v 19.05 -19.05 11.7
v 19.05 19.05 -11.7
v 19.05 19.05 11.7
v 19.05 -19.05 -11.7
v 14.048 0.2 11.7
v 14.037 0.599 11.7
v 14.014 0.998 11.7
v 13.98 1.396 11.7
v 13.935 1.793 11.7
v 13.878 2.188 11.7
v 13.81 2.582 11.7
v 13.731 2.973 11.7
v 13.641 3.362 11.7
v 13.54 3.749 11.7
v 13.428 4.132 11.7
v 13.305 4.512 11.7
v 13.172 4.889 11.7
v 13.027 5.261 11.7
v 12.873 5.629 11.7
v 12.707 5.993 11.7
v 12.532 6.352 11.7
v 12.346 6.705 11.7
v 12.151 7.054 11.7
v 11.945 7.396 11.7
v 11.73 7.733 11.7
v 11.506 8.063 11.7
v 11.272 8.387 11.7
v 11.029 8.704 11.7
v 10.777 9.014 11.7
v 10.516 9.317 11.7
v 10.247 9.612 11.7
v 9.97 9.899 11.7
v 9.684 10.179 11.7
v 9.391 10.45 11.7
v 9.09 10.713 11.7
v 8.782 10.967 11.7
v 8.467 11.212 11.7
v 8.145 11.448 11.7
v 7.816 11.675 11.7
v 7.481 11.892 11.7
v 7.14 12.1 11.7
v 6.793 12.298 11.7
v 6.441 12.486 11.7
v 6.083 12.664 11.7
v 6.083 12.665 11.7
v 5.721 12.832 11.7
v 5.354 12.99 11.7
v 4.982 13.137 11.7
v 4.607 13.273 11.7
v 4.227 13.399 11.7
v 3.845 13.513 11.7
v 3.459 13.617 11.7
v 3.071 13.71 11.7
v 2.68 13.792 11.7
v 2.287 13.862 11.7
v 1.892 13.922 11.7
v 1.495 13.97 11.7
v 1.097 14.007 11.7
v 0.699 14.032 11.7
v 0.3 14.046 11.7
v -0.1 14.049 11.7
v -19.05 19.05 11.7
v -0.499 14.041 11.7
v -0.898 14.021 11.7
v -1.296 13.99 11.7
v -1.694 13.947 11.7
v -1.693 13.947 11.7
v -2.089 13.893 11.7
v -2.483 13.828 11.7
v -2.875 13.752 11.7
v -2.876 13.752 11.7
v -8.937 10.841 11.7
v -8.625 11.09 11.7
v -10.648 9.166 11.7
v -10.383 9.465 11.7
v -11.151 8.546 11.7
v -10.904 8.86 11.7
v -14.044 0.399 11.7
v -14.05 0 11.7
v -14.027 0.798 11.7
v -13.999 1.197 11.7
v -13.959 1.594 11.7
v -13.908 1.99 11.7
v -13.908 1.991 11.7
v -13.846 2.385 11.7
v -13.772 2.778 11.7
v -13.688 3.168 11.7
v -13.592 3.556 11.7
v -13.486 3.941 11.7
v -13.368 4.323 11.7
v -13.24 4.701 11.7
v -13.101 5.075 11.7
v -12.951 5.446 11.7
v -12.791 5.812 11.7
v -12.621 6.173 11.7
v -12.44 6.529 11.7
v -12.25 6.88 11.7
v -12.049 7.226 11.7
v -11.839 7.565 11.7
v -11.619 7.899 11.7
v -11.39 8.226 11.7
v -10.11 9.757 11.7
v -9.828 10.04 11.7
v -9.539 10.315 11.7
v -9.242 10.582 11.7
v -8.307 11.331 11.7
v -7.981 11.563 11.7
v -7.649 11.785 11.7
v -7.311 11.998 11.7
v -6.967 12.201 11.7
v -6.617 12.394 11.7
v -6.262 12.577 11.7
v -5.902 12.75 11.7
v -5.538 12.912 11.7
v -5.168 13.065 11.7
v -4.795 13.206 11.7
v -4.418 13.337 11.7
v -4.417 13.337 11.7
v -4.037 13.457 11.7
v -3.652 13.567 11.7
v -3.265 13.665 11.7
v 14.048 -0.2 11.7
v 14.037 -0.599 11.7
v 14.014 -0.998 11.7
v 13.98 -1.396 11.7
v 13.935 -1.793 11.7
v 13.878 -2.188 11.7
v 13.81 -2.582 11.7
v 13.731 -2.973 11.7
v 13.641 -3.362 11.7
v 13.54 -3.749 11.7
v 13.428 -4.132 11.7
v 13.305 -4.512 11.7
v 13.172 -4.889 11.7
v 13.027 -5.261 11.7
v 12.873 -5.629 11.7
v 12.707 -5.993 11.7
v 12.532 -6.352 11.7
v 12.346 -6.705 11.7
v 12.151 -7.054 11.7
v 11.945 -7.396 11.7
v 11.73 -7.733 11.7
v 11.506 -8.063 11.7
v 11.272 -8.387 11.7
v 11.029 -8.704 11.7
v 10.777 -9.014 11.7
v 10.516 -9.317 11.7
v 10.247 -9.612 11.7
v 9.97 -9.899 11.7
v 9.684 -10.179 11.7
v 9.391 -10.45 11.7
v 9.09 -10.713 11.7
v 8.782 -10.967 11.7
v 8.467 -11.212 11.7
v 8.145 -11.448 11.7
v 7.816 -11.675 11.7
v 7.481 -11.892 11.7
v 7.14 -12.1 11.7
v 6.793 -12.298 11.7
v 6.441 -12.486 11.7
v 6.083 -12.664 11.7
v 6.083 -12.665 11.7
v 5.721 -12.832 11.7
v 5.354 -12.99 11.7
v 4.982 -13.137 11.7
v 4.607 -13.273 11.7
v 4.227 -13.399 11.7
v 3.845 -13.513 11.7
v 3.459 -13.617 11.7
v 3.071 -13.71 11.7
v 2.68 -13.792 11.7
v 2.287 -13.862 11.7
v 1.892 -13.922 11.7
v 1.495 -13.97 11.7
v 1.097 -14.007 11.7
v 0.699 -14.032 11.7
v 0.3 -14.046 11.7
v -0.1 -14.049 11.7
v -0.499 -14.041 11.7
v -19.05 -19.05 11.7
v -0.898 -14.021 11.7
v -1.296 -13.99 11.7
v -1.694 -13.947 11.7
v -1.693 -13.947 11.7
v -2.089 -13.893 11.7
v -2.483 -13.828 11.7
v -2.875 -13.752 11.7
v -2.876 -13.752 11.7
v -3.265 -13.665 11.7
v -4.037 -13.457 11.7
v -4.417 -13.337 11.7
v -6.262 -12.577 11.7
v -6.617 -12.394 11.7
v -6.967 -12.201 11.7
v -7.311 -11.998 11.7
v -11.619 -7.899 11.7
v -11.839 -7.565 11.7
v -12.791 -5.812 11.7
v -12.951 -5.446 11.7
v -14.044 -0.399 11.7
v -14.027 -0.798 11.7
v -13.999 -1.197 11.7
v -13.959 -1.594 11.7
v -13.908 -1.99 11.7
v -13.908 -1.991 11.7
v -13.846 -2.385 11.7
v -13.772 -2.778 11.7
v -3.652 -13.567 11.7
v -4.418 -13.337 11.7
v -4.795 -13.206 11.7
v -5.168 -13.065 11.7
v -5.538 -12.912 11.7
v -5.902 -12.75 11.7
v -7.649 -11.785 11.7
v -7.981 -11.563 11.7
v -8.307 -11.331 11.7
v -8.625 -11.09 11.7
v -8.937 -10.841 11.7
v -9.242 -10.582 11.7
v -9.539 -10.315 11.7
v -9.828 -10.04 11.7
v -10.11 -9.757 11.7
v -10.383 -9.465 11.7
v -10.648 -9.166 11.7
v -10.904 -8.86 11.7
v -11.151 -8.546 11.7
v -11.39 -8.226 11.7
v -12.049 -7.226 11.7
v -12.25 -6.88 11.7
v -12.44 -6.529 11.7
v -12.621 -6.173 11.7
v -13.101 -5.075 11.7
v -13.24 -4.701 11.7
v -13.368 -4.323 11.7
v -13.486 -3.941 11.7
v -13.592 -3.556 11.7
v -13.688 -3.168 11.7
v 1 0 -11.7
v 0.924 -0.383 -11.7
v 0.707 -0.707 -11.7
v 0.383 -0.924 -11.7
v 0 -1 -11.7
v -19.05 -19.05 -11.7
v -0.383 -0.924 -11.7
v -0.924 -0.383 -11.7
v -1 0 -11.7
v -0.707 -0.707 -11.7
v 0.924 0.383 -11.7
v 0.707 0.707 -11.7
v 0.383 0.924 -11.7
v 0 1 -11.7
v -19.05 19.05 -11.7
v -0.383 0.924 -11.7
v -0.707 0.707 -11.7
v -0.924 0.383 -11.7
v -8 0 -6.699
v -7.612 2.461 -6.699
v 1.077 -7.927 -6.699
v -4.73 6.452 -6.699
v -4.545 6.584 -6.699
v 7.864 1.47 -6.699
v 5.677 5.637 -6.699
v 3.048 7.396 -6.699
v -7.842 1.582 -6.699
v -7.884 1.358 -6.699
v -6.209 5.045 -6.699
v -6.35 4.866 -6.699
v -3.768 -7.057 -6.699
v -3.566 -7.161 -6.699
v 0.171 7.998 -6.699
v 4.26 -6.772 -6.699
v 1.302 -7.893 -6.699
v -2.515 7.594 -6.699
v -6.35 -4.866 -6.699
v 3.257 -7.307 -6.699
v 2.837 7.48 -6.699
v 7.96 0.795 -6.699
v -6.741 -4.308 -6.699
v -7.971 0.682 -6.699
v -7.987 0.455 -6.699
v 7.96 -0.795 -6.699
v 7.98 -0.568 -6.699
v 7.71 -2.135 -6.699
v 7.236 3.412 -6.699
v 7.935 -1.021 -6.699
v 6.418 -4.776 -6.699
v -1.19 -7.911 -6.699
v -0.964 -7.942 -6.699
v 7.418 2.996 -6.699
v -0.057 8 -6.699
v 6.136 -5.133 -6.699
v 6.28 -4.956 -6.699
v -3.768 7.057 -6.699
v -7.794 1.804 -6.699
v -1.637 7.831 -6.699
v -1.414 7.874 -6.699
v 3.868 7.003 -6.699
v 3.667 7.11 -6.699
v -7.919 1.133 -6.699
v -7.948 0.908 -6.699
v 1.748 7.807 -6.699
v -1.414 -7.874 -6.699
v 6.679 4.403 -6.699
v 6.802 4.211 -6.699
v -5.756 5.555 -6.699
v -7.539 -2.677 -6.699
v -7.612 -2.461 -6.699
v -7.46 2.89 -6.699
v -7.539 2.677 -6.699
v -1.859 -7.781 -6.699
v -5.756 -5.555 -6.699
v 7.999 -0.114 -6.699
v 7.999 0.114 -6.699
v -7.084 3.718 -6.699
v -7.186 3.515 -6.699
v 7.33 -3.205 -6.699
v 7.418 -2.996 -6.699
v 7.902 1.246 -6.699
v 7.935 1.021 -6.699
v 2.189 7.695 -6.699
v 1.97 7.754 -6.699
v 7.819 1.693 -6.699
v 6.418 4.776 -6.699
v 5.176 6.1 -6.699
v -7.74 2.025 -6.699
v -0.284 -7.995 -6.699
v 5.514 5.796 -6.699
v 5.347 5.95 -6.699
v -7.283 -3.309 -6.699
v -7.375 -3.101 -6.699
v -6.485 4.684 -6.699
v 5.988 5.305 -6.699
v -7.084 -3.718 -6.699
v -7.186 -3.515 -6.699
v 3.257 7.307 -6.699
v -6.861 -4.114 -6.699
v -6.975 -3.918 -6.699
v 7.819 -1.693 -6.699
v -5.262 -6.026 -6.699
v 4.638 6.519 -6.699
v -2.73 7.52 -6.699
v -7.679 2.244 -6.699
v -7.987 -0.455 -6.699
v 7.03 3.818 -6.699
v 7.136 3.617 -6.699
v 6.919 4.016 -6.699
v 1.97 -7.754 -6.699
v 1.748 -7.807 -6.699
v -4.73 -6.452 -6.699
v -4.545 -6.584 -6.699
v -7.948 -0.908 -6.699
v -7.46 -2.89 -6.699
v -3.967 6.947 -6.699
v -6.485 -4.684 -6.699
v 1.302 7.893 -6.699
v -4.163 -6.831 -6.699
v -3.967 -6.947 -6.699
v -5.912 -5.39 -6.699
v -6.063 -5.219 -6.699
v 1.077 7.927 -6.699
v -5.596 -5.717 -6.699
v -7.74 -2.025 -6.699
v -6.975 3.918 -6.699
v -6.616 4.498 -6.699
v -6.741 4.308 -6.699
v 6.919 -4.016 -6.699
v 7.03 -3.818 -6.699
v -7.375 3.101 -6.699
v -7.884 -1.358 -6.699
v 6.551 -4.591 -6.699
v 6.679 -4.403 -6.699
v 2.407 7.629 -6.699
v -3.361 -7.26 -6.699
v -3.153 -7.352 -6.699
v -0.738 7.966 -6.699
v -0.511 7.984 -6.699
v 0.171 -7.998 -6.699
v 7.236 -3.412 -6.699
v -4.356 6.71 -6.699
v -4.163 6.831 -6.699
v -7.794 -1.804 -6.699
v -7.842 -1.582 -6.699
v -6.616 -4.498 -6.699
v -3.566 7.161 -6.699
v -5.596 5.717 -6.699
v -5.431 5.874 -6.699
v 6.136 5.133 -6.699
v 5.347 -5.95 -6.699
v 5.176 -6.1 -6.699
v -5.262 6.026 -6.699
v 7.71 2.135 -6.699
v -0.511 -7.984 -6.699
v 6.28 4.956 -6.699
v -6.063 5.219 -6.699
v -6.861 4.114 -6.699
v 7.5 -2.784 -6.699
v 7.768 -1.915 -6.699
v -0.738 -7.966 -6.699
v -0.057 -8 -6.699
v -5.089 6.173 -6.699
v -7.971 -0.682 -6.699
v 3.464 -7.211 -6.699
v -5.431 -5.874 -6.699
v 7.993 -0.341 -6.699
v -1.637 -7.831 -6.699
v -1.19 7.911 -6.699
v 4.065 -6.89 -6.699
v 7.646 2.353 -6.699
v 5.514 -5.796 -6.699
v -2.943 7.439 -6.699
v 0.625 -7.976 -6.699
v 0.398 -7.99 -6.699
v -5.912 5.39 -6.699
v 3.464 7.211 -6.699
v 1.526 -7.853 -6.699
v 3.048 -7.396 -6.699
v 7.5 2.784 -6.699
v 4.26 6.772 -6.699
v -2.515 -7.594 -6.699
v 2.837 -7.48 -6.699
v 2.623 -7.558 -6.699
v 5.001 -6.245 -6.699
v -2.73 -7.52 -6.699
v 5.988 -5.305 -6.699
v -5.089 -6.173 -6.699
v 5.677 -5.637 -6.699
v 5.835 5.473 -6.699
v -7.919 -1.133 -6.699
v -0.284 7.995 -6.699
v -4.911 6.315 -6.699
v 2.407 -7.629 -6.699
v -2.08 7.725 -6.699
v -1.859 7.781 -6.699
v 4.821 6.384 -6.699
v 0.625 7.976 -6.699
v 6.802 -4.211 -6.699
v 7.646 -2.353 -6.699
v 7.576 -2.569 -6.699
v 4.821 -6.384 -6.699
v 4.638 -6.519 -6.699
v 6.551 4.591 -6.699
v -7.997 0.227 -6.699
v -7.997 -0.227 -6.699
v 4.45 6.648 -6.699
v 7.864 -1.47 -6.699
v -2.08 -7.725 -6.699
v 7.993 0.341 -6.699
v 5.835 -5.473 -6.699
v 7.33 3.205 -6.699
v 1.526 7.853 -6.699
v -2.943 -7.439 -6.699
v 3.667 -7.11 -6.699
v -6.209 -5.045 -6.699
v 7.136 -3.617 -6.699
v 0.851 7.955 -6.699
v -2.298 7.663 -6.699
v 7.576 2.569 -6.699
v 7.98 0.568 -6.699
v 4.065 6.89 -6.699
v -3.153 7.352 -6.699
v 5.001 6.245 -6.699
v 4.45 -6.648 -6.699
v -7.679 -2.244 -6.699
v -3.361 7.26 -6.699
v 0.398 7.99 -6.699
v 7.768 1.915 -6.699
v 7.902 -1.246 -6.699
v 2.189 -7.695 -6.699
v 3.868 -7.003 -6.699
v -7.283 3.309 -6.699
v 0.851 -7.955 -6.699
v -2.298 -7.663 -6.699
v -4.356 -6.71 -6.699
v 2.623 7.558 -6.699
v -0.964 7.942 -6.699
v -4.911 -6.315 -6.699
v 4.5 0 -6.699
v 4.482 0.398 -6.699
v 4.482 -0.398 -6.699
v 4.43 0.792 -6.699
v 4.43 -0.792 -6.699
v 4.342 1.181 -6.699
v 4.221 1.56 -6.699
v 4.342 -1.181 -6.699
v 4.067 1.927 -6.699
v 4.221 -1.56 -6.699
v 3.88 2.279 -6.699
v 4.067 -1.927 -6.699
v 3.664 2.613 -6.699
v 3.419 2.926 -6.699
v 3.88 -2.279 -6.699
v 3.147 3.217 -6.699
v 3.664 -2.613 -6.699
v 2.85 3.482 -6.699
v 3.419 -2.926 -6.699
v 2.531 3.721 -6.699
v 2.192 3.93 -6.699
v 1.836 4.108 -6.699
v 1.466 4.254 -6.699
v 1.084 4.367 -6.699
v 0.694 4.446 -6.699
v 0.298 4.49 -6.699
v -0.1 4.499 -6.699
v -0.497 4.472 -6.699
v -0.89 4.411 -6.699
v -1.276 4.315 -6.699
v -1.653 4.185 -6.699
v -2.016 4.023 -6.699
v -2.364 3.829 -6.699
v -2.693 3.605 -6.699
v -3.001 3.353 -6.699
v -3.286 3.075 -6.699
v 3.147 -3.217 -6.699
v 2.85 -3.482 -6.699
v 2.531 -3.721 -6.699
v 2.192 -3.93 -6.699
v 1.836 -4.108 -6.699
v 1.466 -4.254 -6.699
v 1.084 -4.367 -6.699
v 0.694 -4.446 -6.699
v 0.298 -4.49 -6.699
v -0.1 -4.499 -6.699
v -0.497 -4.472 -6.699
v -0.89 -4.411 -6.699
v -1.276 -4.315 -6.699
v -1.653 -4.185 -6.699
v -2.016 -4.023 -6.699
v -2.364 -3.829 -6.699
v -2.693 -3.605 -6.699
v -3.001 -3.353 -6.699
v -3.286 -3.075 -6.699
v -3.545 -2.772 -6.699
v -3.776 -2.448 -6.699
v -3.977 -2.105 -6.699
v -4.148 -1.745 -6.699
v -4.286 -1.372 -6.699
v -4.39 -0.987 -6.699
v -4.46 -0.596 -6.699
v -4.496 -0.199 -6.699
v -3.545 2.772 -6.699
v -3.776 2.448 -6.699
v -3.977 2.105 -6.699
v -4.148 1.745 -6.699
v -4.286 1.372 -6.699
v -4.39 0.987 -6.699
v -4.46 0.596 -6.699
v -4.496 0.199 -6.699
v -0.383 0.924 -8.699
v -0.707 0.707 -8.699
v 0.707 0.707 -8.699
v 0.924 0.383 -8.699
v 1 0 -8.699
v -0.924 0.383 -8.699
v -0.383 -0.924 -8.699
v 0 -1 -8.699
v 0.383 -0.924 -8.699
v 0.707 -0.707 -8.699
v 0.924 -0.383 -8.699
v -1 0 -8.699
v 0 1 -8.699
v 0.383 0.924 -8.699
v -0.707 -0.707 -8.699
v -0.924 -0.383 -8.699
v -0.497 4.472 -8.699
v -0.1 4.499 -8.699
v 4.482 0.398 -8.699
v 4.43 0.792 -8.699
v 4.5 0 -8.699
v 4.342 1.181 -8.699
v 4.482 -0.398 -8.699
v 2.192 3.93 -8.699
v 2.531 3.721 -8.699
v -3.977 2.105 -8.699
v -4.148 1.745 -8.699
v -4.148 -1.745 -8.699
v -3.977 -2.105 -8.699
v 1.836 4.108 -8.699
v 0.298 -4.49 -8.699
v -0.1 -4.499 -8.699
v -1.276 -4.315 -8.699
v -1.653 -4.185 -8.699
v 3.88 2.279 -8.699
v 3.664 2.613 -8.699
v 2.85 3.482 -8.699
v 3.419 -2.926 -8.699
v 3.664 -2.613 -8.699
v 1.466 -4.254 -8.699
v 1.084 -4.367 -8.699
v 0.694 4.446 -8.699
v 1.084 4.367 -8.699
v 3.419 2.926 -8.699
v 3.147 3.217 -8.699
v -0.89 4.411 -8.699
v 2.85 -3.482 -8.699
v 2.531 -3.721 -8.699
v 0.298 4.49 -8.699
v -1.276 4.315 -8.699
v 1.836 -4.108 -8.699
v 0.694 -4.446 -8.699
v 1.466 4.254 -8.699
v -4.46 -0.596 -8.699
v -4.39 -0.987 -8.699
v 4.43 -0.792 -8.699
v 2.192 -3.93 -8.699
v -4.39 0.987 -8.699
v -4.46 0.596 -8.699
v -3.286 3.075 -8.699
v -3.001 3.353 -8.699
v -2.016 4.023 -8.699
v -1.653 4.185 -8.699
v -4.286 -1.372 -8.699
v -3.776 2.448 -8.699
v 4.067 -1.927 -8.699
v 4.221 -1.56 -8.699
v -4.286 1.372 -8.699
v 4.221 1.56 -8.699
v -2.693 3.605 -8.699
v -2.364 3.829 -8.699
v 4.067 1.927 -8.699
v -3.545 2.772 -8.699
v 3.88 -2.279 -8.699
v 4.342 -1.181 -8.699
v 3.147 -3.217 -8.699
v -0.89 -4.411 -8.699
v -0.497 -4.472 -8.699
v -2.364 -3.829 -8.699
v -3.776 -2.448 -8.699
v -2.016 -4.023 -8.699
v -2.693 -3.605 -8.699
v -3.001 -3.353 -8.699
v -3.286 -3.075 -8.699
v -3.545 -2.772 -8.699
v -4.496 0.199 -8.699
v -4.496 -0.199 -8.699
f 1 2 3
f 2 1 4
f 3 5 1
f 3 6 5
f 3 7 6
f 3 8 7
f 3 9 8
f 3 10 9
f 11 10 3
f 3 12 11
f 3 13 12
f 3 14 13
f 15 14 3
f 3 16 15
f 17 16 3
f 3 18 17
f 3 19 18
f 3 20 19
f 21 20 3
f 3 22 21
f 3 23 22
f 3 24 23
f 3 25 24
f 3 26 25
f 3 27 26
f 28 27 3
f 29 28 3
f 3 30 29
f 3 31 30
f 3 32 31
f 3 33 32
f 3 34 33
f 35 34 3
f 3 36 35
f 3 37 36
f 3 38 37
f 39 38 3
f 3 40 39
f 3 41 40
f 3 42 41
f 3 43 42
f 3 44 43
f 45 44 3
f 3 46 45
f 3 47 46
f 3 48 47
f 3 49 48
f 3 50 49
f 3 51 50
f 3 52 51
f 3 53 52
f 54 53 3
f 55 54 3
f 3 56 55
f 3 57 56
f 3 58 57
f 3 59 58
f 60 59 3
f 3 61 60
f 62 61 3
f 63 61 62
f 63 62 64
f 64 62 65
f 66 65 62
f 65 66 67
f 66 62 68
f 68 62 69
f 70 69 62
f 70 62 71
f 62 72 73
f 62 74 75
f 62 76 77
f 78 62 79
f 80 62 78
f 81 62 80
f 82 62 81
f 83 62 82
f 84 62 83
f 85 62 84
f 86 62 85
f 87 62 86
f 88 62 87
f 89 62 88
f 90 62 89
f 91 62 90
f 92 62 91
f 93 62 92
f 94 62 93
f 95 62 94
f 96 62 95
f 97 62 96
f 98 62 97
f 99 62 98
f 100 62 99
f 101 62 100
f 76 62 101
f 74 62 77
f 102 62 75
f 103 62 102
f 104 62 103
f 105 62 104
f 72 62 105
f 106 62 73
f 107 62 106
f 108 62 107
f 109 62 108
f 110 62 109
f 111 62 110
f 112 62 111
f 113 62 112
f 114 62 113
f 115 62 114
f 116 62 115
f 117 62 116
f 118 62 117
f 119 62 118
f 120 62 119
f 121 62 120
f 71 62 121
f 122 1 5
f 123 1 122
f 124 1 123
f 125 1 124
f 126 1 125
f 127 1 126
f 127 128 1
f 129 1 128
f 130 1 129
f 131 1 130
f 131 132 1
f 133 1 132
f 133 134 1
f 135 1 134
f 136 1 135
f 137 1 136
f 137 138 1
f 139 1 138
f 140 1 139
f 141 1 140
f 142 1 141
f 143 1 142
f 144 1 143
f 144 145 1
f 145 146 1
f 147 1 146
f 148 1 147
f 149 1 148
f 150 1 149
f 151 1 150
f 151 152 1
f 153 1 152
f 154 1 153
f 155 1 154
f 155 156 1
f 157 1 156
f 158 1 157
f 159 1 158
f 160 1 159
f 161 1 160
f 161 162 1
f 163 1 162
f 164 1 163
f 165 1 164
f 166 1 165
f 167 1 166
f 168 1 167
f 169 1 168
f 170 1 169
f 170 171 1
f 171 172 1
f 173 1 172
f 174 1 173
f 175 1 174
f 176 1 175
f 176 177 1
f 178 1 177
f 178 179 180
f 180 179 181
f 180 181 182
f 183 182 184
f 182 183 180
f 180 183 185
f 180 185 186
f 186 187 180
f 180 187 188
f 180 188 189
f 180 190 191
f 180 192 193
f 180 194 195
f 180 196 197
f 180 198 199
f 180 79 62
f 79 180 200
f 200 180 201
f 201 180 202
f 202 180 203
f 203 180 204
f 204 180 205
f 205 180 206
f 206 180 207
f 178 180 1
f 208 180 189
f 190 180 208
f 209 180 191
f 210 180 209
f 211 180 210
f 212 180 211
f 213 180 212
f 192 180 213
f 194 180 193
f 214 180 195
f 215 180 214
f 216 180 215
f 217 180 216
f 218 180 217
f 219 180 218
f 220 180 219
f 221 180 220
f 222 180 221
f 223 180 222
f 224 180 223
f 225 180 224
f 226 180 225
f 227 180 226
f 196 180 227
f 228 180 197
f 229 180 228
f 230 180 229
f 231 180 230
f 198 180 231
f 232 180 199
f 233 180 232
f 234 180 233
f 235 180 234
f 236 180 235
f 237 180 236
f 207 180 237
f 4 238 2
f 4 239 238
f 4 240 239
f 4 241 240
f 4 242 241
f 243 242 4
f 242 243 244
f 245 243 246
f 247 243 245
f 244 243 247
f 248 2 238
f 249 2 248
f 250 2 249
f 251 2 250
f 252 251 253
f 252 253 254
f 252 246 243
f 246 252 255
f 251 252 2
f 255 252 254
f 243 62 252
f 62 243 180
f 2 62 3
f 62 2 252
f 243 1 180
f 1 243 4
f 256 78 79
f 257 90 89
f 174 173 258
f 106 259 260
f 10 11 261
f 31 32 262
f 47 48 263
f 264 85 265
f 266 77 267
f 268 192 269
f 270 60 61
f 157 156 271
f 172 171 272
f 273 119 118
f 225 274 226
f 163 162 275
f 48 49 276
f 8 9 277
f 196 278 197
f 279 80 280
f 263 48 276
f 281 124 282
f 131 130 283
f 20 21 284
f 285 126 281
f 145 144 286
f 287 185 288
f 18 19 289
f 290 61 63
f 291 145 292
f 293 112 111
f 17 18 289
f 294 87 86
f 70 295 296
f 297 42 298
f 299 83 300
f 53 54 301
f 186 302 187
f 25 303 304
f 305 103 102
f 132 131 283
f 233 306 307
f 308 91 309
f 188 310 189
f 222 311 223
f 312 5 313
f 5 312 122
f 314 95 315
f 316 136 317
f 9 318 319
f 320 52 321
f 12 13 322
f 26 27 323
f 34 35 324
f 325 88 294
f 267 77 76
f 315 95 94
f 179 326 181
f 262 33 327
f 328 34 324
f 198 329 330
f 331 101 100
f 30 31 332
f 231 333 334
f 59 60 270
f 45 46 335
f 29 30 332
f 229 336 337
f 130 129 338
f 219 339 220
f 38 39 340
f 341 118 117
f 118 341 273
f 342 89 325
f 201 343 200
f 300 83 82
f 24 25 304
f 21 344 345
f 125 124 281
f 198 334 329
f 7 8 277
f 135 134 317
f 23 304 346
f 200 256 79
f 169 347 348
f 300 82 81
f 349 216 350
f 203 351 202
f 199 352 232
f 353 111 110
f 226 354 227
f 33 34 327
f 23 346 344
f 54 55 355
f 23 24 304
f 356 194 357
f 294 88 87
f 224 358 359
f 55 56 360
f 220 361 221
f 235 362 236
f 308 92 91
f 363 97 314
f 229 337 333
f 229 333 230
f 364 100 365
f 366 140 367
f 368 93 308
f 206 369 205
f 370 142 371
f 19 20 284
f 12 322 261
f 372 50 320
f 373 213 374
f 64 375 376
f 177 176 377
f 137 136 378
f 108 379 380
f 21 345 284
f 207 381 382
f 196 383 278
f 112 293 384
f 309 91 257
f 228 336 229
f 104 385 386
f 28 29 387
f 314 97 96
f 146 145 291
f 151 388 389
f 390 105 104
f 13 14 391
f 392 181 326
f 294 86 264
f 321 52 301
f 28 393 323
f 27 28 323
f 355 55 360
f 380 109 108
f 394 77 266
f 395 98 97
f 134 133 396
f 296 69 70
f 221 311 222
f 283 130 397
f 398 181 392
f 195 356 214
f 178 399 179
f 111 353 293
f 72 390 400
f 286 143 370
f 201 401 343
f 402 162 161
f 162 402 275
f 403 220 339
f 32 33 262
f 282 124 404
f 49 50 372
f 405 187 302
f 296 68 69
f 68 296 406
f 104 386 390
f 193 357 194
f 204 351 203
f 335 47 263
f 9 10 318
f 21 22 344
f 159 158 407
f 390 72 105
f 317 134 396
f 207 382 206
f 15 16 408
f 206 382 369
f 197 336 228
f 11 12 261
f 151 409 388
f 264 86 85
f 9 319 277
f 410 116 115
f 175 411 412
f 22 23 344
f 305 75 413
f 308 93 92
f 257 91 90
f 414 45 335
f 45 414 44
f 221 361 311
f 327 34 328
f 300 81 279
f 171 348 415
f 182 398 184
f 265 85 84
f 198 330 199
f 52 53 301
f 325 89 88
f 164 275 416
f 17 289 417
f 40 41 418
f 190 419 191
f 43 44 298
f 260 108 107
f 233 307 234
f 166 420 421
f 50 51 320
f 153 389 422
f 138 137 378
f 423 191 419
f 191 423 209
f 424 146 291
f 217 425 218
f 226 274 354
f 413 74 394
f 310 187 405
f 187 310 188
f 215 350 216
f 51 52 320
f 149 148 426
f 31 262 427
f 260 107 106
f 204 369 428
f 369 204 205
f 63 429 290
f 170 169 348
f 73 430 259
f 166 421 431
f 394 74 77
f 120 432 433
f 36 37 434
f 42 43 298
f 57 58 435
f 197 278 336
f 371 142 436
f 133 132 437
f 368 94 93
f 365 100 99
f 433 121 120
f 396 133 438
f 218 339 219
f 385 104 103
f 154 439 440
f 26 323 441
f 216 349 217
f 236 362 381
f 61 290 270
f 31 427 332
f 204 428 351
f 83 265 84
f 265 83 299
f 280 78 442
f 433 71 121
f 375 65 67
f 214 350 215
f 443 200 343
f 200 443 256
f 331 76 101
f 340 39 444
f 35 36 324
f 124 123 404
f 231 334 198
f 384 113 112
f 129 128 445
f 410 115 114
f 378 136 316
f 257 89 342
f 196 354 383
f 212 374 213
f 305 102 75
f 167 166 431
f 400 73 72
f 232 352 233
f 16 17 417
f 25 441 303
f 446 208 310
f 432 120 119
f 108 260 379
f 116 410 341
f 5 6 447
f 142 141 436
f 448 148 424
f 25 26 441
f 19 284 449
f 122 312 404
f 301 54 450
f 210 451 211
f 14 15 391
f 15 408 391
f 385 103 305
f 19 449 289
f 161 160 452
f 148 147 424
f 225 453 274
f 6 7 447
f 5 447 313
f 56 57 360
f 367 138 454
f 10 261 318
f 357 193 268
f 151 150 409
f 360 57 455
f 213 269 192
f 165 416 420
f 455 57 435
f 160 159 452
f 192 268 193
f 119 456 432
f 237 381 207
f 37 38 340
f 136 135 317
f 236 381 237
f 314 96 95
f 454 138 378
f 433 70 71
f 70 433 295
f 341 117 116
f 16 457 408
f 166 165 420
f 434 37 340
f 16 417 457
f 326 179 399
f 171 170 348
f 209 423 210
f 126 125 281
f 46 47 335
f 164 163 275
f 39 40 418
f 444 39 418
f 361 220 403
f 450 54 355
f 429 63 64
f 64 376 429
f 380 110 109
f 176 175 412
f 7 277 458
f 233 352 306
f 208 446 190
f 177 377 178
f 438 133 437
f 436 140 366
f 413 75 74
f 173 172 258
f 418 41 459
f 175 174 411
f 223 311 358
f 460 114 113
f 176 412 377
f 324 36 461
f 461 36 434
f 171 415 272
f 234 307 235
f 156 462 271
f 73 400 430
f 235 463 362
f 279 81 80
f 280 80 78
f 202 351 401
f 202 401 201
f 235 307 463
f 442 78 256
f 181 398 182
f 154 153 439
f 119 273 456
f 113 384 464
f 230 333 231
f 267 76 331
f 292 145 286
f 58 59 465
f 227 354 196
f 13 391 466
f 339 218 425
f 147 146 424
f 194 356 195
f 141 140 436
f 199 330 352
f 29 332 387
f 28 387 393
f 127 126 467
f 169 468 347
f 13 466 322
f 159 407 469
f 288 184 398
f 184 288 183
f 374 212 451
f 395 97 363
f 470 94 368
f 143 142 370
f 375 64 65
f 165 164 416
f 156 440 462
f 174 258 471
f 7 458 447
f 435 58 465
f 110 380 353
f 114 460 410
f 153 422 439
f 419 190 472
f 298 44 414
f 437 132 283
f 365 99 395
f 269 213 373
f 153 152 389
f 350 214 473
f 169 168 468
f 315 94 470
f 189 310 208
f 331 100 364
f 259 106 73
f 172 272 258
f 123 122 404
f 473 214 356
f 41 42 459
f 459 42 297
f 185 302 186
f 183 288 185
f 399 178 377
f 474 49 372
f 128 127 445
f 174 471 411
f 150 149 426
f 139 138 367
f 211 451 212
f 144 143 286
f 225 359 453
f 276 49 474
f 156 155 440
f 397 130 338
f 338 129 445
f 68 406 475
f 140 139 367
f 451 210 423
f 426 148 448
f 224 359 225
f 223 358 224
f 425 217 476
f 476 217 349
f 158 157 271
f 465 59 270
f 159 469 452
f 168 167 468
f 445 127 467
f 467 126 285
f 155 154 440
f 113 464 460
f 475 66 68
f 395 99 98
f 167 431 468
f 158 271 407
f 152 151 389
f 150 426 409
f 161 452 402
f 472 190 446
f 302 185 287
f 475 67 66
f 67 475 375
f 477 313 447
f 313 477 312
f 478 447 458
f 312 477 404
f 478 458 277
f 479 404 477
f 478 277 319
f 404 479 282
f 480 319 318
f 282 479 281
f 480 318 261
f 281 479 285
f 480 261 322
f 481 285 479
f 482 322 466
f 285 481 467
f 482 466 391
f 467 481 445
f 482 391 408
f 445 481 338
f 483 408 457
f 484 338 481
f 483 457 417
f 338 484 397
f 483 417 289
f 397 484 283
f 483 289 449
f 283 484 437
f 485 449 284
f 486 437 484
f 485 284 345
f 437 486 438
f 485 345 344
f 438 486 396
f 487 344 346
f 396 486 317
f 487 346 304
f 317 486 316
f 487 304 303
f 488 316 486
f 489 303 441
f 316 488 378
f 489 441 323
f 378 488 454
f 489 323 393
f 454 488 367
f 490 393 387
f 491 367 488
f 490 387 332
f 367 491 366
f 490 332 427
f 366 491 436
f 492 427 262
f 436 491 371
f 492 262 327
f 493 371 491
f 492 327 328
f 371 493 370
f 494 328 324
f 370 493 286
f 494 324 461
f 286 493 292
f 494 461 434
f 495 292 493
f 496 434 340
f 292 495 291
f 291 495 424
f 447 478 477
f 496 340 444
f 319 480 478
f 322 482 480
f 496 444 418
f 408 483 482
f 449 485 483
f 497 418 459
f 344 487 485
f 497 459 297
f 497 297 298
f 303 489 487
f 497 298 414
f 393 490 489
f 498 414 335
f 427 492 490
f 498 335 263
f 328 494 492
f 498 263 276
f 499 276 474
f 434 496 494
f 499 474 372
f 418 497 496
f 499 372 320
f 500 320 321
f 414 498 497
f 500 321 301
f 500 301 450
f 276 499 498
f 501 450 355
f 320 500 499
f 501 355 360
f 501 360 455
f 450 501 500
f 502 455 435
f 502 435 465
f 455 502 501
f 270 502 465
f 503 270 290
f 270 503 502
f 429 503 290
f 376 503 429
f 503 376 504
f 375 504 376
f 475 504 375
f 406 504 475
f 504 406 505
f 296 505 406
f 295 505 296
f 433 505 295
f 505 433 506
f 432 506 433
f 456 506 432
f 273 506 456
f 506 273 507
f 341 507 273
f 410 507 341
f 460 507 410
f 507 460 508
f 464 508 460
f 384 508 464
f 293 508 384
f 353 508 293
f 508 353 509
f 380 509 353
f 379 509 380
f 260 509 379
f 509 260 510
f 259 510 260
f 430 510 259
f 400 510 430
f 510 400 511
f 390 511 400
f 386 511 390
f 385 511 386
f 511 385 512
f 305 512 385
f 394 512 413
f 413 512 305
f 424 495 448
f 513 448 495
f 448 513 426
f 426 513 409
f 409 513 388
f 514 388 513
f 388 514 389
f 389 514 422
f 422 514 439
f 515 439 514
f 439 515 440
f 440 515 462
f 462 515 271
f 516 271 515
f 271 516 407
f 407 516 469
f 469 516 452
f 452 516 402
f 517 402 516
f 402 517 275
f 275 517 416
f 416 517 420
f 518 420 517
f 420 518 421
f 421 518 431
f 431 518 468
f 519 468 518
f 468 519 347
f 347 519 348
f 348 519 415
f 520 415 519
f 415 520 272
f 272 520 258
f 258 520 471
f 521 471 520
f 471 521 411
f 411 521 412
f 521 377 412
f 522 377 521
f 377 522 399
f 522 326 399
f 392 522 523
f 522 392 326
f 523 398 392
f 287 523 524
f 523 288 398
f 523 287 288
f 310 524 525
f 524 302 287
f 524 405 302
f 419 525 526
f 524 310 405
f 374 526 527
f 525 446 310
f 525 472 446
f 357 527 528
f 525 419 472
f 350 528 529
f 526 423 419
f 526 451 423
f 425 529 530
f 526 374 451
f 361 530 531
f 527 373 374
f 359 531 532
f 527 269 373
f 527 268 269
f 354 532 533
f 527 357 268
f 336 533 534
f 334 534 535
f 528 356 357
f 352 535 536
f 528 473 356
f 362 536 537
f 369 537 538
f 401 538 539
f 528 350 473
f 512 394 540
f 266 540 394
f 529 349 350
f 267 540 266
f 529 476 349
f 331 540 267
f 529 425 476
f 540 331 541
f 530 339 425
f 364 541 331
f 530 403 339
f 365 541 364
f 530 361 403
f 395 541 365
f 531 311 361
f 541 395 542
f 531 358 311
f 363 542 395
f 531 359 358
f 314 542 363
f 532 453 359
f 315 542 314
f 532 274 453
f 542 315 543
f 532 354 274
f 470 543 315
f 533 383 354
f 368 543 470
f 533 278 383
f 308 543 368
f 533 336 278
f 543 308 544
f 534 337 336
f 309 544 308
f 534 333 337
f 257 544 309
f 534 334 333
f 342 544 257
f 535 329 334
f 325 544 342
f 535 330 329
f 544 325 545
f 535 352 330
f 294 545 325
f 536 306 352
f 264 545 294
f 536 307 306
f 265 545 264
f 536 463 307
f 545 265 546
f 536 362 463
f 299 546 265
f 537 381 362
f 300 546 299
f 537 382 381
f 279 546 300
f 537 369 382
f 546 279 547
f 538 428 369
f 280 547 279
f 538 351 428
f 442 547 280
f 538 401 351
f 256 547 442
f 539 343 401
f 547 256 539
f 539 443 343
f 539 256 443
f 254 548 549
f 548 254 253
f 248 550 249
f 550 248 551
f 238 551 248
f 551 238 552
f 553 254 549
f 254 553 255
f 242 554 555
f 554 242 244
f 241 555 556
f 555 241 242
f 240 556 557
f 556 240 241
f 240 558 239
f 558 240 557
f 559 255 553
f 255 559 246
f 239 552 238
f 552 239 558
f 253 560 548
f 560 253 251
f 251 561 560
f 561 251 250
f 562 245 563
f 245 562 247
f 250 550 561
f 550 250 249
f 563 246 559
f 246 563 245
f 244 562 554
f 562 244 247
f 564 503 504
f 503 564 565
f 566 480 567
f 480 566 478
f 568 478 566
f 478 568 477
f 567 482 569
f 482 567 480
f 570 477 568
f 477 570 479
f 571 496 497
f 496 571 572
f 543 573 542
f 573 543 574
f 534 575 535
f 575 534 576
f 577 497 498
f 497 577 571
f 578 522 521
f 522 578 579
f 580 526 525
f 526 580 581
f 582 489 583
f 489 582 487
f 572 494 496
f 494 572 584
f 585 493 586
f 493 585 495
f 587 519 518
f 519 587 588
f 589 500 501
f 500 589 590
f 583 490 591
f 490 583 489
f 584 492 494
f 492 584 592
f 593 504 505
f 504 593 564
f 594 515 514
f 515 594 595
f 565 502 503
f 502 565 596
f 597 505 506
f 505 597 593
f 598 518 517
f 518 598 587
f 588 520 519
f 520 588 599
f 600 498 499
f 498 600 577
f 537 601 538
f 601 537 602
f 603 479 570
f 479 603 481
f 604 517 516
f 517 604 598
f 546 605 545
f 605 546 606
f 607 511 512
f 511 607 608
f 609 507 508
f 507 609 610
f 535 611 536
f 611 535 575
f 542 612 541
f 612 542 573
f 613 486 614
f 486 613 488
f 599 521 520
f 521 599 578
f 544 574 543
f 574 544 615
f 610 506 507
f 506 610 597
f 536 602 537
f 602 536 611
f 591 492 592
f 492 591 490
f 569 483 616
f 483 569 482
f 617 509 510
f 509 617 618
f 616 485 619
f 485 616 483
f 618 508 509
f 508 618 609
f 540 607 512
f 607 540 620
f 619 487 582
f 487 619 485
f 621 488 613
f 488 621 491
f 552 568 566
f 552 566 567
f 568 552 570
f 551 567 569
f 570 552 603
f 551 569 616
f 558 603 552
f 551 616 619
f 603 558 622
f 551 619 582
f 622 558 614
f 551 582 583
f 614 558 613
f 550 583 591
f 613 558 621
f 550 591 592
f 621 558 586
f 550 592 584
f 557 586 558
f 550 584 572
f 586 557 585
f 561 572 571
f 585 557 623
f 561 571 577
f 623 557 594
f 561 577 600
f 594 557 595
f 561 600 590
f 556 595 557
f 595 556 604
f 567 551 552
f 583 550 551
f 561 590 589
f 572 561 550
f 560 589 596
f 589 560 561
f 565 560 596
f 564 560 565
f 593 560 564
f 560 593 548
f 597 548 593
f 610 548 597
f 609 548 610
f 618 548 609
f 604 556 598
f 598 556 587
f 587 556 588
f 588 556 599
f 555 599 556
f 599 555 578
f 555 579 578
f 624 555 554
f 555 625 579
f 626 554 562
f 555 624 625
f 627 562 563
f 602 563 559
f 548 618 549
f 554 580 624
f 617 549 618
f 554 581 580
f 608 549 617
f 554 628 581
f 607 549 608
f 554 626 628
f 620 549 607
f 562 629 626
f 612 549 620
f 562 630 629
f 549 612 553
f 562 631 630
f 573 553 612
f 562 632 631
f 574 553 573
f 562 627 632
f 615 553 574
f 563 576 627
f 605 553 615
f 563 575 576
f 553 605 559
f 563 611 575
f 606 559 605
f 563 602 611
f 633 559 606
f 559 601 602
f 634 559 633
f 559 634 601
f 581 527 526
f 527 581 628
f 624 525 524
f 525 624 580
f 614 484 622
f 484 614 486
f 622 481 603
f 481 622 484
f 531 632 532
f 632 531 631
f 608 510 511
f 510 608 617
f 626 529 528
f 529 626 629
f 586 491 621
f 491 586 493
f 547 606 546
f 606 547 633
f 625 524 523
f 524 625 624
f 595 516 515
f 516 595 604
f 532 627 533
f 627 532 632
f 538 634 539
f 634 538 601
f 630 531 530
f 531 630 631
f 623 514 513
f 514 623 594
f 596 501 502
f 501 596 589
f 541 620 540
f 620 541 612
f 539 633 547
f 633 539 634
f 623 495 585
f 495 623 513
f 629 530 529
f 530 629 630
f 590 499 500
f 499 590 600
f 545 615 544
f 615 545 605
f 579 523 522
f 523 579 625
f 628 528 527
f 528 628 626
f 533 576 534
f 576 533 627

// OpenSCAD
$fa = 1;
$fs = 0.4;

epsilon = 0.001;

// The width of each table leg.
// The legs are square, so this is also the length.
leg_width = 38.1;

// The radius for screw holes.
screw_hole_radius = 1.0;

// The height of all bottom leg attachments, when
// stacked in their final arrangement
bottom_leg_attachment_total_height = 25.4;

// The height of the narrow portion of the bottom
// leg attachment anchor piece
bottom_leg_attachment_anchor_height = 2.0;

// The height of the upper clip of the bottom leg attachment.
bottom_leg_attachment_clip_height = bottom_leg_attachment_total_height - bottom_leg_attachment_anchor_height;

// The dimensions of the conical protrusion that
// attach to the base
cone_small_r = 8;
cone_large_r = (leg_width / 2) - (2.5 * 2);
cone_height = bottom_leg_attachment_total_height - bottom_leg_attachment_anchor_height - 5.0;

difference() {
  cube([leg_width, leg_width, bottom_leg_attachment_clip_height], center=true);

  cone_z_translation = (cone_height / 2) - (bottom_leg_attachment_clip_height / 2) + (bottom_leg_attachment_clip_height - cone_height) + epsilon;

  // Cut out the cone shape
  translate(v = [0, 0, cone_z_translation]) {
    rotate(a = [0,180,0]) {
      cylinder(h=cone_height, r1=cone_large_r, r2=cone_small_r, center=true);
    }
  }

  // Cut out the screw hole
  cylinder(h=bottom_leg_attachment_total_height * 2, r=screw_hole_radius, center=true);

  // Cut out clearance for the screw head
  translate(v = [0, 0, cone_z_translation - 2.0]) {
    cylinder(h=cone_height, r=(cone_small_r + screw_hole_radius) / 2, center=true);
  }
}
